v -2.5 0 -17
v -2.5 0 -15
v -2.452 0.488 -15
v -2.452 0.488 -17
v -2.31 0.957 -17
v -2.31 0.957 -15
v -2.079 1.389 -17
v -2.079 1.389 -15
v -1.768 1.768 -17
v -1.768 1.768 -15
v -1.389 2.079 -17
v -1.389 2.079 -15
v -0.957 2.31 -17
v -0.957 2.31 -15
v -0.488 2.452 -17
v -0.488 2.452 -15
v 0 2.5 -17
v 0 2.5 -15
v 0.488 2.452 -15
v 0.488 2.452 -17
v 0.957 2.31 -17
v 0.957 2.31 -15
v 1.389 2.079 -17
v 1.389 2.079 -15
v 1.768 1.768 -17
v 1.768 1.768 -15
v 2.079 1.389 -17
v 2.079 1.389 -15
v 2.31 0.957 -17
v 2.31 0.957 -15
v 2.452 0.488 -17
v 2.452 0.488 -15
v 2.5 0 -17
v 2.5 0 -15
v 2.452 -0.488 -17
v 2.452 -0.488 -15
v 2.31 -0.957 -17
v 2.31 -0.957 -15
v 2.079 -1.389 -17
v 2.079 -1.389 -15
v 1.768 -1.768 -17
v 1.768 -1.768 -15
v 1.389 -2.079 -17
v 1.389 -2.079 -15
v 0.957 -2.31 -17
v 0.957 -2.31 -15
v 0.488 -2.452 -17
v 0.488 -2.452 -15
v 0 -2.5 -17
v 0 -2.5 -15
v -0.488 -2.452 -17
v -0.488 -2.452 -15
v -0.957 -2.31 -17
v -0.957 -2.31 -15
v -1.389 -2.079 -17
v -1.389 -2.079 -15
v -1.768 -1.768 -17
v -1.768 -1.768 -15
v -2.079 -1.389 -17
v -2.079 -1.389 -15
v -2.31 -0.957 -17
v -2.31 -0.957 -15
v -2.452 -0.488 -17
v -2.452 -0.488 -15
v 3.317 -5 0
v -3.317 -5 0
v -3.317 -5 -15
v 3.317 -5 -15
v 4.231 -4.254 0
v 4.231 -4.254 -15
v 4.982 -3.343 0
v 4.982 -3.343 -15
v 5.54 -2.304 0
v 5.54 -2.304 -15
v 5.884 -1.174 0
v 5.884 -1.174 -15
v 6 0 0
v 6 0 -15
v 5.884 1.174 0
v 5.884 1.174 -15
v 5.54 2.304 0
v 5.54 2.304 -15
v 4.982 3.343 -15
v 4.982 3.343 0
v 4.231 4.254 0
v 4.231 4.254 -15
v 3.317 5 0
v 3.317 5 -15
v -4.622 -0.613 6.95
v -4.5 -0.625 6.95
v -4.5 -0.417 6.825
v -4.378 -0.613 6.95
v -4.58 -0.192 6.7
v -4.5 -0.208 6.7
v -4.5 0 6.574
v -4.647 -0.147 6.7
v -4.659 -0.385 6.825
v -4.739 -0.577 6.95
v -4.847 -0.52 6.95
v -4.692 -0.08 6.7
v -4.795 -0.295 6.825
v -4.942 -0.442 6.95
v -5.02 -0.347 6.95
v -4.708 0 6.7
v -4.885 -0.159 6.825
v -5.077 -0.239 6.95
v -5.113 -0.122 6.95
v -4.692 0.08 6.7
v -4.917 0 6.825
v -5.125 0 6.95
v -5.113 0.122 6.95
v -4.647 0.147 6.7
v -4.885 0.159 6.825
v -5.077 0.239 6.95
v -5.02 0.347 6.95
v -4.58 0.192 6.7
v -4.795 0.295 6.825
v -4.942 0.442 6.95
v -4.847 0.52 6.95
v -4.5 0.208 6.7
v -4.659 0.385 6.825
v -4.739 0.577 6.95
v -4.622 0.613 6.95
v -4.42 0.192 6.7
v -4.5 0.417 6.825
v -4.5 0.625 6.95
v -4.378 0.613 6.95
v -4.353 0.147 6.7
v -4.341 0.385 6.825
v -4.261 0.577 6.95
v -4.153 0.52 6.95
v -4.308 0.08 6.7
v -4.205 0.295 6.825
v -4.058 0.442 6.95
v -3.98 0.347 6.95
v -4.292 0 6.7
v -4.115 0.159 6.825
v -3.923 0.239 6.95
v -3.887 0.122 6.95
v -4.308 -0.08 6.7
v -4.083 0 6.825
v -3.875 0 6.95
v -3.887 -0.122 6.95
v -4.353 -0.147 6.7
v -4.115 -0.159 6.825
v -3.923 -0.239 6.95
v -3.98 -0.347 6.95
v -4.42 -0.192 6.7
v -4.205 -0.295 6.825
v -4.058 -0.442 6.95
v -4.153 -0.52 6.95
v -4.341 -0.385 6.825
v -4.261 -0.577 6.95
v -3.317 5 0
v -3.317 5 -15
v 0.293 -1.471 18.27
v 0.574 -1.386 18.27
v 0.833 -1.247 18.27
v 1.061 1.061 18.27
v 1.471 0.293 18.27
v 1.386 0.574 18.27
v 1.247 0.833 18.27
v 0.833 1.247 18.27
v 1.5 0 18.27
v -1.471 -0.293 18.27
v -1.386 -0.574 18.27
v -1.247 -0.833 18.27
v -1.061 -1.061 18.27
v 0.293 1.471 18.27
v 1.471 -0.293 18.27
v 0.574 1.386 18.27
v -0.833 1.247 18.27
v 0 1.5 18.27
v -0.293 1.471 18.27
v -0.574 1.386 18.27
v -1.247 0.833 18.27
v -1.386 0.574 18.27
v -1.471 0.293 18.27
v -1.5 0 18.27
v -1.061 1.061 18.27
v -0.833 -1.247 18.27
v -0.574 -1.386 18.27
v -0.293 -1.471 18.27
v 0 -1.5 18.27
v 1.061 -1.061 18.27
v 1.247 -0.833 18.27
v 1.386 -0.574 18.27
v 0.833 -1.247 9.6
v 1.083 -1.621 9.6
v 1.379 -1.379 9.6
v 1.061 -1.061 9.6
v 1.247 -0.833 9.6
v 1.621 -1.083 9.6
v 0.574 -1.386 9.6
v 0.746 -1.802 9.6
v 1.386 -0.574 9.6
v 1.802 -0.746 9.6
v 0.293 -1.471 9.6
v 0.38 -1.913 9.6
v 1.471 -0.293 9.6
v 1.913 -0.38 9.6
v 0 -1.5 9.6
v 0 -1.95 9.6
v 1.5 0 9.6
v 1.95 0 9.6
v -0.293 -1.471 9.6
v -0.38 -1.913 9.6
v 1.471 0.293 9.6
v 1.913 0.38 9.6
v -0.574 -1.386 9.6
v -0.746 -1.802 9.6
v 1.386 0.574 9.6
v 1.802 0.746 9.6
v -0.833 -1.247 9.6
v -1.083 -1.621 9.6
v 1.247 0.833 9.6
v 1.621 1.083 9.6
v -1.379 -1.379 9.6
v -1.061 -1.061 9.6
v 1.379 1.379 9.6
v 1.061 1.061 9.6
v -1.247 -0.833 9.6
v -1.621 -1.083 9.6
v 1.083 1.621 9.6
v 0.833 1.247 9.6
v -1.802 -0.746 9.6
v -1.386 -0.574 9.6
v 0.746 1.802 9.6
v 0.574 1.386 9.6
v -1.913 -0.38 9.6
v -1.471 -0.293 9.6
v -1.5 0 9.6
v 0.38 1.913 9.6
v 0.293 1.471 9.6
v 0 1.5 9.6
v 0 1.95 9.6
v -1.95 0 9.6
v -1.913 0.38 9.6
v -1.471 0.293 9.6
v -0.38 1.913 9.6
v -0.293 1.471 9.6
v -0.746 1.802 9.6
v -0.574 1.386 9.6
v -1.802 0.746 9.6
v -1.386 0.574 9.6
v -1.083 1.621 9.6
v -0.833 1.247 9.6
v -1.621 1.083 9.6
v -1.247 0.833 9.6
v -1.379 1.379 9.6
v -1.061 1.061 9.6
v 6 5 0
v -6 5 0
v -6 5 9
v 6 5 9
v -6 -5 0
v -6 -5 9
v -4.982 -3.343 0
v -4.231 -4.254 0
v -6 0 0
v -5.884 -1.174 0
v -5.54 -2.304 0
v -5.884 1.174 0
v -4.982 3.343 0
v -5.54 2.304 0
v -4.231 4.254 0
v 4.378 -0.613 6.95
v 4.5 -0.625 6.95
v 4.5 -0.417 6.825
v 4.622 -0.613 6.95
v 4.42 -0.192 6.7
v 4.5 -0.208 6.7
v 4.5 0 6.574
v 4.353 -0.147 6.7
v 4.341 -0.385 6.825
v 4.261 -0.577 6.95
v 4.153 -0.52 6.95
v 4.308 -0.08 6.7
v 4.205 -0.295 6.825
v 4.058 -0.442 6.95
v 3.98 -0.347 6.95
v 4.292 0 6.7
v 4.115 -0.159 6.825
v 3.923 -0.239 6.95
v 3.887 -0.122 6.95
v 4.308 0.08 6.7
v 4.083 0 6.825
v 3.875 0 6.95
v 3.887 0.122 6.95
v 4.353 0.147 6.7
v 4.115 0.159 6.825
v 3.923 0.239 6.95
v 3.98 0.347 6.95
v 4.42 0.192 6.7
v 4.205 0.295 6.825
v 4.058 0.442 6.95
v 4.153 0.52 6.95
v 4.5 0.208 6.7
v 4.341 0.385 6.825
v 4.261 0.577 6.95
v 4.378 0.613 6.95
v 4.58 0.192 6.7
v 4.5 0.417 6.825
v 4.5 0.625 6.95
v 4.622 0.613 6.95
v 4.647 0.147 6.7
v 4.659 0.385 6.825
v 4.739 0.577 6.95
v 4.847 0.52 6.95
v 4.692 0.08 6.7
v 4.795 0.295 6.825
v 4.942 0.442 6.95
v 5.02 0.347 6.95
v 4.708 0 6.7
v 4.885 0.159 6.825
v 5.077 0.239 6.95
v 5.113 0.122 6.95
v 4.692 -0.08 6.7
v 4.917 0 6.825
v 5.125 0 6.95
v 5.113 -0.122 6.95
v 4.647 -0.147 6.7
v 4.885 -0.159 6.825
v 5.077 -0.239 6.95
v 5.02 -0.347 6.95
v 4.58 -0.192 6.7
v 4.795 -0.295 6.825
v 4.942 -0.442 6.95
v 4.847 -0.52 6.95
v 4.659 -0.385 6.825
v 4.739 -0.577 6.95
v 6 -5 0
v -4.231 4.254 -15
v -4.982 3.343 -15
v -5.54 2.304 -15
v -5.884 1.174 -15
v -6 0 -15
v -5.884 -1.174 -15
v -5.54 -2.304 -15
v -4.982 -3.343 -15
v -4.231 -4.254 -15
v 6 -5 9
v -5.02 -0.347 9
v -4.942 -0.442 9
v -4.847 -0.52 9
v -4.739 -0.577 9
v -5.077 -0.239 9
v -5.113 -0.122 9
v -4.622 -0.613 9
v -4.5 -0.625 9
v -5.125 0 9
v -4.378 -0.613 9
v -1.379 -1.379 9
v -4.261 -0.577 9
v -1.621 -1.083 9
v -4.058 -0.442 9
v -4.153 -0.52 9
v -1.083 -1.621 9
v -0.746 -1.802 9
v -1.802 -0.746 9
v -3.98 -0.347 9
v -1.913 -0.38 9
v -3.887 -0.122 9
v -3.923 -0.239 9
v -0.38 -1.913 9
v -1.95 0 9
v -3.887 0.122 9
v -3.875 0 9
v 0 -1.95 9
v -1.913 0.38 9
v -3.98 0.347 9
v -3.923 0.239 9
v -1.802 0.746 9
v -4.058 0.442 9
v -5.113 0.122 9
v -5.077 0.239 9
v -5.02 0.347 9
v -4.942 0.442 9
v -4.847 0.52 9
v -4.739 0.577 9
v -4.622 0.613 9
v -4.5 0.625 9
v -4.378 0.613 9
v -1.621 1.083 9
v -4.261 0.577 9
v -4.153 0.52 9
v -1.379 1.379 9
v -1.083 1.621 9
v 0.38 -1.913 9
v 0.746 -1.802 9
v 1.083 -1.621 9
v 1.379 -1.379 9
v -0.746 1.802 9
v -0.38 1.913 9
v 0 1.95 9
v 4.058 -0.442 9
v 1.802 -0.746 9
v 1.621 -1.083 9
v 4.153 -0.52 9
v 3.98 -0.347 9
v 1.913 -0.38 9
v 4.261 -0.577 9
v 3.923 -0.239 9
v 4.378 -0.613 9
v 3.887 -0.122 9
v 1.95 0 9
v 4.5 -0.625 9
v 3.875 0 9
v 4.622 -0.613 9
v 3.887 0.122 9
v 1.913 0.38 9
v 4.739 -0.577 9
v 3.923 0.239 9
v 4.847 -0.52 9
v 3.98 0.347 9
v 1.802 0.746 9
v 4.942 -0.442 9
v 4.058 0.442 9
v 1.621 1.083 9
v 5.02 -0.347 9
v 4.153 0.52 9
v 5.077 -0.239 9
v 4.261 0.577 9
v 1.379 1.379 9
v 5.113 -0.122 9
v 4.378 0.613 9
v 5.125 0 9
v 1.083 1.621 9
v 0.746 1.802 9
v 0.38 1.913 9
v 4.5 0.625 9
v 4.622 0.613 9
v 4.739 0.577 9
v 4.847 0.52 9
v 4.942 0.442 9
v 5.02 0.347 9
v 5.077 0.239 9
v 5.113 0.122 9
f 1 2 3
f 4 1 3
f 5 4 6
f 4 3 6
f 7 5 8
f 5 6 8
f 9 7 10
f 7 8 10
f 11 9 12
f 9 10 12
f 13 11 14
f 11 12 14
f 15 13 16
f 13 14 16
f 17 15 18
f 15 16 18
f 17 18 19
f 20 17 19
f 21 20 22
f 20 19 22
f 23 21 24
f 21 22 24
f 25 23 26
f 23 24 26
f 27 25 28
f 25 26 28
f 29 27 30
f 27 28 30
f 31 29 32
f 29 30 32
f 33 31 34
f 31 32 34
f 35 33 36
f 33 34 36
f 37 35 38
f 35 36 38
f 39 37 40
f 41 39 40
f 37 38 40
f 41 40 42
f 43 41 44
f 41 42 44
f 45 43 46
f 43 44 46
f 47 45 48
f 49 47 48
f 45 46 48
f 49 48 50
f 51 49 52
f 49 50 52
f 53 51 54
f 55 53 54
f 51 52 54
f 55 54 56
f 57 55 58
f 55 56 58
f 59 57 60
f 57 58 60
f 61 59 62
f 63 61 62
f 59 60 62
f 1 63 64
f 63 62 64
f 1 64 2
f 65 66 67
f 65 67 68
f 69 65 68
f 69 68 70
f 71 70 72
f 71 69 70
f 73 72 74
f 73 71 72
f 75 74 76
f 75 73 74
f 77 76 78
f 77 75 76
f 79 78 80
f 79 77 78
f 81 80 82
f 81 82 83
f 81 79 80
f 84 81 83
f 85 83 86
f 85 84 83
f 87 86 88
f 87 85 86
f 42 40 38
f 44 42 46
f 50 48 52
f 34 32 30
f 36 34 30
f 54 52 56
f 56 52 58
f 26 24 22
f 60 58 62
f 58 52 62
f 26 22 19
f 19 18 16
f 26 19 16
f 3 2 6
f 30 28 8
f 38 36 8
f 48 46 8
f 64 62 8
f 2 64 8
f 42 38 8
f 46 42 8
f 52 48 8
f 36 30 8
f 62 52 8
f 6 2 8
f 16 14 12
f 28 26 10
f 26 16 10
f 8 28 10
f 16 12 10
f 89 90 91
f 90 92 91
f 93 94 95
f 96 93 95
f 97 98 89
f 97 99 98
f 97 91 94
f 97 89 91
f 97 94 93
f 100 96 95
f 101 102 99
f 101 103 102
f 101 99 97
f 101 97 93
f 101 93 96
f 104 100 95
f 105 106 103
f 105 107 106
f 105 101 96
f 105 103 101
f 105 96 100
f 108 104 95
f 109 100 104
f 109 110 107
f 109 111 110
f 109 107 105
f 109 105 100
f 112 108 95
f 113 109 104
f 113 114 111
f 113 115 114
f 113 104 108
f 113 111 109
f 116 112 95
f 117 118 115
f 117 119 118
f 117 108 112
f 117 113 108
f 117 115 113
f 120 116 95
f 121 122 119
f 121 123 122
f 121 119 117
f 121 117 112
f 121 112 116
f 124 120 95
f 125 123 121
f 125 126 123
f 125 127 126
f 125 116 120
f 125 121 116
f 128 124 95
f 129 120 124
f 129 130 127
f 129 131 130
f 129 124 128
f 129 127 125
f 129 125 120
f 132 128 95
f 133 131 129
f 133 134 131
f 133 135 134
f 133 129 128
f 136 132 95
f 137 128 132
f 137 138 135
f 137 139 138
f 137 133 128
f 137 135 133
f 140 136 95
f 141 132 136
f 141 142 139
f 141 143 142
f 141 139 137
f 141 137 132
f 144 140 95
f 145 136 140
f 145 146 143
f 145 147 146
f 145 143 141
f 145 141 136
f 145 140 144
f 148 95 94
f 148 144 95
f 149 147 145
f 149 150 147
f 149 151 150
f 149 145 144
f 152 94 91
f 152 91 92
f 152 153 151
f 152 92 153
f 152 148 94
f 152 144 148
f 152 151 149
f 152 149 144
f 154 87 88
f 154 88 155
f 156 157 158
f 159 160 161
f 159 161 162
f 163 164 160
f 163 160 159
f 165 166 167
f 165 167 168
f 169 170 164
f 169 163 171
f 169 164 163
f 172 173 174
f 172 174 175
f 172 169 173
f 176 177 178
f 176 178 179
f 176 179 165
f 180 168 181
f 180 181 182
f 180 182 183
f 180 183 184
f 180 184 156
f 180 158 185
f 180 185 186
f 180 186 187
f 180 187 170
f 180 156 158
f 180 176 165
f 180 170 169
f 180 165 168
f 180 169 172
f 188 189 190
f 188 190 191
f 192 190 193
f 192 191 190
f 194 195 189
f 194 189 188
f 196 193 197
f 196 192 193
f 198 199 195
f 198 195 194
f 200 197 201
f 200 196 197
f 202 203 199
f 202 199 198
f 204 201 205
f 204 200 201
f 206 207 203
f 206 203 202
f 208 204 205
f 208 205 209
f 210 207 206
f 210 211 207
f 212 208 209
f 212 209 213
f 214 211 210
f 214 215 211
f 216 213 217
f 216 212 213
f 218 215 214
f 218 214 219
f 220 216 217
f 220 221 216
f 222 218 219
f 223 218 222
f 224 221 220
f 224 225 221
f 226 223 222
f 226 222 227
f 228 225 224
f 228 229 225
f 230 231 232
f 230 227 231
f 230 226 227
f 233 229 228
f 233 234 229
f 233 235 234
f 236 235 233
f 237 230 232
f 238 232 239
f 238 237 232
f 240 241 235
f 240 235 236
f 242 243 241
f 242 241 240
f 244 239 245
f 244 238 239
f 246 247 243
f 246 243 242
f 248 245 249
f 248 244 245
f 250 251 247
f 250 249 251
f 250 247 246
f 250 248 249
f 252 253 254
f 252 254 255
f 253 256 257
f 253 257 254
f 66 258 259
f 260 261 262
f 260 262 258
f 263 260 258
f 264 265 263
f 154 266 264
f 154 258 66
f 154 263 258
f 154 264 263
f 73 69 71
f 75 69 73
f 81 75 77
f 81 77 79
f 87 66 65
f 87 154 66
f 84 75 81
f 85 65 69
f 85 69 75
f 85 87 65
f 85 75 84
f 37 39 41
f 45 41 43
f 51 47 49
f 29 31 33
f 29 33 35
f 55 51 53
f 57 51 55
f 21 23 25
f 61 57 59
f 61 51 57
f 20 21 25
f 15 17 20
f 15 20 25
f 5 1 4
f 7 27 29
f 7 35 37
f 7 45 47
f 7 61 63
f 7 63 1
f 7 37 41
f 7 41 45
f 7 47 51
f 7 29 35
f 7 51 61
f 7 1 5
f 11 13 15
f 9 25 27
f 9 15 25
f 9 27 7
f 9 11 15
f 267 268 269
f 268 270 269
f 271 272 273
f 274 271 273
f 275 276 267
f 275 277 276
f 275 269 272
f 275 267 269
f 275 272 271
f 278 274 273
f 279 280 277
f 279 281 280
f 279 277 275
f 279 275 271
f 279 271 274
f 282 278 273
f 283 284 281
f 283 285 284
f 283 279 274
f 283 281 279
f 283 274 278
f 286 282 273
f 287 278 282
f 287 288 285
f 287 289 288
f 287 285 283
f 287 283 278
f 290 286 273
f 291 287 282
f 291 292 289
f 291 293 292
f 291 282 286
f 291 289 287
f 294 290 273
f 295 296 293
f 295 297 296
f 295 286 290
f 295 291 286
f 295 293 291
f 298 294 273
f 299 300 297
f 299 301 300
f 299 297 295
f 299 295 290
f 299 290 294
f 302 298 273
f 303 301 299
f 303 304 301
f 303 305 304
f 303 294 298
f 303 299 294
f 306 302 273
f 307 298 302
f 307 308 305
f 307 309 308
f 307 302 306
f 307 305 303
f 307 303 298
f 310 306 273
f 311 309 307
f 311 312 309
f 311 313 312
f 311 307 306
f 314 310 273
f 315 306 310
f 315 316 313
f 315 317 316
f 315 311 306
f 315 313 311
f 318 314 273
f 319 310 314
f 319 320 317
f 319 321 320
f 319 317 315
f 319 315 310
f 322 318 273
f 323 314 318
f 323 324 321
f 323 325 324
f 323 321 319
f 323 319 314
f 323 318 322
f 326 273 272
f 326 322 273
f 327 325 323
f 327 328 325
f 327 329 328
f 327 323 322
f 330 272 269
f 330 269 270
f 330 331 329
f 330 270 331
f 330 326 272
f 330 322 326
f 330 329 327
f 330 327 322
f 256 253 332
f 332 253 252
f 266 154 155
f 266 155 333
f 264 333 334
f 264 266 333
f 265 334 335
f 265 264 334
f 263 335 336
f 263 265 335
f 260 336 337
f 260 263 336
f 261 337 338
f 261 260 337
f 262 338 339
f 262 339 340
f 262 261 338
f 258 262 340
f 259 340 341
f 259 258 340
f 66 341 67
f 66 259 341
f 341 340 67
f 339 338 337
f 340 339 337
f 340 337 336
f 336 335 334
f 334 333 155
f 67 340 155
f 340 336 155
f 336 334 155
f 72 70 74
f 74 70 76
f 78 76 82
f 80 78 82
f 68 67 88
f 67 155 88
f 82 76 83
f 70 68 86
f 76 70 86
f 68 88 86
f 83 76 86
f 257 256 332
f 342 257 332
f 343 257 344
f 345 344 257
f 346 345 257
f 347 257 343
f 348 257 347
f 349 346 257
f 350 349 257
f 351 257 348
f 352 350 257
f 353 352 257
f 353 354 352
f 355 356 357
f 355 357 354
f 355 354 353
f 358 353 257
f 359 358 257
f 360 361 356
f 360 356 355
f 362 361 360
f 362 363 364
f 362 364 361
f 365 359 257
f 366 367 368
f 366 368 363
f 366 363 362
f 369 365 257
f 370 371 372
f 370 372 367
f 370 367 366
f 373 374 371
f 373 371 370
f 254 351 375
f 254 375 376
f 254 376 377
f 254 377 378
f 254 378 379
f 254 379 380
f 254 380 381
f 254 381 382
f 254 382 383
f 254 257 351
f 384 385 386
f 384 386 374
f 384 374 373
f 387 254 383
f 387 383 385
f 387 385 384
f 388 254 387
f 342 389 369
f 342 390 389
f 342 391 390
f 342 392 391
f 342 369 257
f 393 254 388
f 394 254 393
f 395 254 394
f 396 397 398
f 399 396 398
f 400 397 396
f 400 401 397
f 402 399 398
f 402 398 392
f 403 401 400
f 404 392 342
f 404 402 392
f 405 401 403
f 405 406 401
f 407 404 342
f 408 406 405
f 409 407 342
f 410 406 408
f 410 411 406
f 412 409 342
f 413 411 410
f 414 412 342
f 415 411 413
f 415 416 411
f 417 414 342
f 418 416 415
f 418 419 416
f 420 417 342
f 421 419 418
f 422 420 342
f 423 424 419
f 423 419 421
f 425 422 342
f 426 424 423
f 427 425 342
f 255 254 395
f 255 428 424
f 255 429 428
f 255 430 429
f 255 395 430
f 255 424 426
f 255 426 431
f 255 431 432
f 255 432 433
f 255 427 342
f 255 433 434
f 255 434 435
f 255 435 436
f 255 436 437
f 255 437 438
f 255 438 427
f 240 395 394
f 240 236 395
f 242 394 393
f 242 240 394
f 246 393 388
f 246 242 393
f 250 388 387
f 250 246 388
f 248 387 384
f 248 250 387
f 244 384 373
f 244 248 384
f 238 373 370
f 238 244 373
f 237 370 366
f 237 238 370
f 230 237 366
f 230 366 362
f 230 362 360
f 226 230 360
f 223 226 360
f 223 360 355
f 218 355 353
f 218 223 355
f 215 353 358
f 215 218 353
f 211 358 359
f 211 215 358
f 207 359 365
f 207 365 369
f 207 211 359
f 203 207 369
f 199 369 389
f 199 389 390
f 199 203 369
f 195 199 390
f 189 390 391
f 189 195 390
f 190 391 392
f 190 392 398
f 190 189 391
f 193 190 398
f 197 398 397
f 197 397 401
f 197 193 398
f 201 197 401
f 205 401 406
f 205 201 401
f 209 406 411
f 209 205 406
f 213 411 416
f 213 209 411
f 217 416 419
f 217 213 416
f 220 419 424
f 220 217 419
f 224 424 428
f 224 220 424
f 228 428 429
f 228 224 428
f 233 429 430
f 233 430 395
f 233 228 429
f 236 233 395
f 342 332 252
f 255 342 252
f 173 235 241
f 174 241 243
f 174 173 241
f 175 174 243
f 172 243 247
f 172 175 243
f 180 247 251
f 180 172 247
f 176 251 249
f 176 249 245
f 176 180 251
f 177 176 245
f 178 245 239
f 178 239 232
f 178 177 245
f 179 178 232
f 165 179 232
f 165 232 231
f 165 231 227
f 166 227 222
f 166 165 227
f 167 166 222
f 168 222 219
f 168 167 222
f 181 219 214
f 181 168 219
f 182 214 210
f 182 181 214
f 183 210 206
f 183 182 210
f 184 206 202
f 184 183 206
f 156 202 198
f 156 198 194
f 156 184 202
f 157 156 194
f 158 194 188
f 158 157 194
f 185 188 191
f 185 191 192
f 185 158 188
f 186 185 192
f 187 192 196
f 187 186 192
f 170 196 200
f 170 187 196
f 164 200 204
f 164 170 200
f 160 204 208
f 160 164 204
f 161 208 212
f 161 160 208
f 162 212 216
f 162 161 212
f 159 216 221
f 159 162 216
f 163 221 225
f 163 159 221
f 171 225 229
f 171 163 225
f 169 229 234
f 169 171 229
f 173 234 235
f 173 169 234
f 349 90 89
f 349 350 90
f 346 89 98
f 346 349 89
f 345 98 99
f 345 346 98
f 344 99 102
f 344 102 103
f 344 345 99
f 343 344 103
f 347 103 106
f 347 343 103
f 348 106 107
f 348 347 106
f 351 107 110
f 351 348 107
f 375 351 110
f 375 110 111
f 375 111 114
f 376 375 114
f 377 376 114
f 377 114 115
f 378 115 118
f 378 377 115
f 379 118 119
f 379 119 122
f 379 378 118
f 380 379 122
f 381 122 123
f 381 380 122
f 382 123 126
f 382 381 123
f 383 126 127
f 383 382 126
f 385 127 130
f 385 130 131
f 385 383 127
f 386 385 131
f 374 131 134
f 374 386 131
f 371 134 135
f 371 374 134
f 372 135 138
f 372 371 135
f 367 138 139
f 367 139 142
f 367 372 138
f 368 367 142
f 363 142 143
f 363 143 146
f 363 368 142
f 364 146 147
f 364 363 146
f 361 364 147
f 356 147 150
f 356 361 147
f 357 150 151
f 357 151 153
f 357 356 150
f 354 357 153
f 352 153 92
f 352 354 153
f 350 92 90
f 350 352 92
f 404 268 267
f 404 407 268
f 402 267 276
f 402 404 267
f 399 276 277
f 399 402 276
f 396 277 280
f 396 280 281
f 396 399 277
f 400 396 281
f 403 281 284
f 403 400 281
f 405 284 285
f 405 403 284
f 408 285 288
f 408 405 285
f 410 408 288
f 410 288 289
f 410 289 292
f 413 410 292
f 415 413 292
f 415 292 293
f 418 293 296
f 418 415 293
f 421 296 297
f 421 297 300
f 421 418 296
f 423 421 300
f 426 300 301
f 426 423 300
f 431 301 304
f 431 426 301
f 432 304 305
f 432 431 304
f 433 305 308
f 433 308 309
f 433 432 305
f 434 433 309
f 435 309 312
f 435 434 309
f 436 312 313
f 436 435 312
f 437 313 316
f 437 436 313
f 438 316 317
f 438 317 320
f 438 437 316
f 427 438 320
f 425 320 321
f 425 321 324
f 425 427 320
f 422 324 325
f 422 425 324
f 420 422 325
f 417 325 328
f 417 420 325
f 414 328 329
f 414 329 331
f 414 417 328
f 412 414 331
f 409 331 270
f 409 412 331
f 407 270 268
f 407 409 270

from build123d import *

# Parameters (mm, degrees)
SKETCH1_W                         = 12
SKETCH1_H                         = 10
BOSS_EXTRUDE1_DEPTH               = 9
BOSS_EXTRUDE2_DEPTH               = 15
SKETCH4_R                         = 2.5
BOSS_EXTRUDE3_DEPTH               = 2
M1_6X0_35_TAPPED_HOLE1_AT_2_COUNT = 2
M1_6X0_35_TAPPED_HOLE1_AT_2_PITCH = 9


with BuildPart() as part:
    # Sketch1 → Boss-Extrude1 (new body)
    with BuildSketch(Plane.XY):
        Rectangle(SKETCH1_W, SKETCH1_H)
    extrude(amount=BOSS_EXTRUDE1_DEPTH)

    # Sketch2 → Revolve1 (revolve)
    with BuildSketch(Plane(origin=(0, 0, 0), x_dir=(0, 0, -1), z_dir=(1, 0, 0))):
        Polygon((-9, 0), (-9, 1.95), (-9.6, 1.95), (-9.6, 1.5), (-18.27, 1.5), (-18.27, 0), align=None)
    revolve(axis=Axis((0, 0, 9), (0, 0, 1)))

    # Sketch5 → M1.6x0.35 Tapped Hole1 (revolve, cut)
    with BuildSketch(Plane(origin=(-4.5, 0, 9), x_dir=(0, -1, 0), z_dir=(1, 0, 0))):
        Polygon((0, 0), (0, 2.425537887), (0.625, 2.05), (0.625, 0), align=None)
    m1_6x0_35_tapped_hole1 = revolve(axis=Axis((-4.5, 0, 15.35), (0, 0, -1)), mode=Mode.SUBTRACT)

    # M1.6x0.35 Tapped Hole1 at 2: M1.6x0.35 Tapped Hole1 ×2
    with Locations(*[(i * M1_6X0_35_TAPPED_HOLE1_AT_2_PITCH, 0, 0) for i in range(1, M1_6X0_35_TAPPED_HOLE1_AT_2_COUNT)]):
        add(m1_6x0_35_tapped_hole1, mode=Mode.SUBTRACT)


with BuildPart() as body_2:
    # Sketch3 → Boss-Extrude2 (new body)
    with BuildSketch(Plane(origin=(0, 0, 0), x_dir=(-1, 0, 0), z_dir=(0, 0, -1))):
        with BuildLine():
            Line((-3.31662479, 5), (3.31662479, 5))
            ThreePointArc((3.31662479, 5), (6, 0), (3.31662479, -5))
            Line((3.31662479, -5), (-3.31662479, -5))
            ThreePointArc((-3.31662479, -5), (-6, 0), (-3.31662479, 5))
        make_face()
    extrude(amount=BOSS_EXTRUDE2_DEPTH)


with BuildPart() as body_3:
    # Sketch4 → Boss-Extrude3 (new body)
    with BuildSketch(Plane(origin=(0, 0, -15), x_dir=(-1, 0, 0), z_dir=(0, 0, -1))):
        Circle(SKETCH4_R)
    extrude(amount=BOSS_EXTRUDE3_DEPTH)


solid = Compound([part.part, body_2.part, body_3.part])
